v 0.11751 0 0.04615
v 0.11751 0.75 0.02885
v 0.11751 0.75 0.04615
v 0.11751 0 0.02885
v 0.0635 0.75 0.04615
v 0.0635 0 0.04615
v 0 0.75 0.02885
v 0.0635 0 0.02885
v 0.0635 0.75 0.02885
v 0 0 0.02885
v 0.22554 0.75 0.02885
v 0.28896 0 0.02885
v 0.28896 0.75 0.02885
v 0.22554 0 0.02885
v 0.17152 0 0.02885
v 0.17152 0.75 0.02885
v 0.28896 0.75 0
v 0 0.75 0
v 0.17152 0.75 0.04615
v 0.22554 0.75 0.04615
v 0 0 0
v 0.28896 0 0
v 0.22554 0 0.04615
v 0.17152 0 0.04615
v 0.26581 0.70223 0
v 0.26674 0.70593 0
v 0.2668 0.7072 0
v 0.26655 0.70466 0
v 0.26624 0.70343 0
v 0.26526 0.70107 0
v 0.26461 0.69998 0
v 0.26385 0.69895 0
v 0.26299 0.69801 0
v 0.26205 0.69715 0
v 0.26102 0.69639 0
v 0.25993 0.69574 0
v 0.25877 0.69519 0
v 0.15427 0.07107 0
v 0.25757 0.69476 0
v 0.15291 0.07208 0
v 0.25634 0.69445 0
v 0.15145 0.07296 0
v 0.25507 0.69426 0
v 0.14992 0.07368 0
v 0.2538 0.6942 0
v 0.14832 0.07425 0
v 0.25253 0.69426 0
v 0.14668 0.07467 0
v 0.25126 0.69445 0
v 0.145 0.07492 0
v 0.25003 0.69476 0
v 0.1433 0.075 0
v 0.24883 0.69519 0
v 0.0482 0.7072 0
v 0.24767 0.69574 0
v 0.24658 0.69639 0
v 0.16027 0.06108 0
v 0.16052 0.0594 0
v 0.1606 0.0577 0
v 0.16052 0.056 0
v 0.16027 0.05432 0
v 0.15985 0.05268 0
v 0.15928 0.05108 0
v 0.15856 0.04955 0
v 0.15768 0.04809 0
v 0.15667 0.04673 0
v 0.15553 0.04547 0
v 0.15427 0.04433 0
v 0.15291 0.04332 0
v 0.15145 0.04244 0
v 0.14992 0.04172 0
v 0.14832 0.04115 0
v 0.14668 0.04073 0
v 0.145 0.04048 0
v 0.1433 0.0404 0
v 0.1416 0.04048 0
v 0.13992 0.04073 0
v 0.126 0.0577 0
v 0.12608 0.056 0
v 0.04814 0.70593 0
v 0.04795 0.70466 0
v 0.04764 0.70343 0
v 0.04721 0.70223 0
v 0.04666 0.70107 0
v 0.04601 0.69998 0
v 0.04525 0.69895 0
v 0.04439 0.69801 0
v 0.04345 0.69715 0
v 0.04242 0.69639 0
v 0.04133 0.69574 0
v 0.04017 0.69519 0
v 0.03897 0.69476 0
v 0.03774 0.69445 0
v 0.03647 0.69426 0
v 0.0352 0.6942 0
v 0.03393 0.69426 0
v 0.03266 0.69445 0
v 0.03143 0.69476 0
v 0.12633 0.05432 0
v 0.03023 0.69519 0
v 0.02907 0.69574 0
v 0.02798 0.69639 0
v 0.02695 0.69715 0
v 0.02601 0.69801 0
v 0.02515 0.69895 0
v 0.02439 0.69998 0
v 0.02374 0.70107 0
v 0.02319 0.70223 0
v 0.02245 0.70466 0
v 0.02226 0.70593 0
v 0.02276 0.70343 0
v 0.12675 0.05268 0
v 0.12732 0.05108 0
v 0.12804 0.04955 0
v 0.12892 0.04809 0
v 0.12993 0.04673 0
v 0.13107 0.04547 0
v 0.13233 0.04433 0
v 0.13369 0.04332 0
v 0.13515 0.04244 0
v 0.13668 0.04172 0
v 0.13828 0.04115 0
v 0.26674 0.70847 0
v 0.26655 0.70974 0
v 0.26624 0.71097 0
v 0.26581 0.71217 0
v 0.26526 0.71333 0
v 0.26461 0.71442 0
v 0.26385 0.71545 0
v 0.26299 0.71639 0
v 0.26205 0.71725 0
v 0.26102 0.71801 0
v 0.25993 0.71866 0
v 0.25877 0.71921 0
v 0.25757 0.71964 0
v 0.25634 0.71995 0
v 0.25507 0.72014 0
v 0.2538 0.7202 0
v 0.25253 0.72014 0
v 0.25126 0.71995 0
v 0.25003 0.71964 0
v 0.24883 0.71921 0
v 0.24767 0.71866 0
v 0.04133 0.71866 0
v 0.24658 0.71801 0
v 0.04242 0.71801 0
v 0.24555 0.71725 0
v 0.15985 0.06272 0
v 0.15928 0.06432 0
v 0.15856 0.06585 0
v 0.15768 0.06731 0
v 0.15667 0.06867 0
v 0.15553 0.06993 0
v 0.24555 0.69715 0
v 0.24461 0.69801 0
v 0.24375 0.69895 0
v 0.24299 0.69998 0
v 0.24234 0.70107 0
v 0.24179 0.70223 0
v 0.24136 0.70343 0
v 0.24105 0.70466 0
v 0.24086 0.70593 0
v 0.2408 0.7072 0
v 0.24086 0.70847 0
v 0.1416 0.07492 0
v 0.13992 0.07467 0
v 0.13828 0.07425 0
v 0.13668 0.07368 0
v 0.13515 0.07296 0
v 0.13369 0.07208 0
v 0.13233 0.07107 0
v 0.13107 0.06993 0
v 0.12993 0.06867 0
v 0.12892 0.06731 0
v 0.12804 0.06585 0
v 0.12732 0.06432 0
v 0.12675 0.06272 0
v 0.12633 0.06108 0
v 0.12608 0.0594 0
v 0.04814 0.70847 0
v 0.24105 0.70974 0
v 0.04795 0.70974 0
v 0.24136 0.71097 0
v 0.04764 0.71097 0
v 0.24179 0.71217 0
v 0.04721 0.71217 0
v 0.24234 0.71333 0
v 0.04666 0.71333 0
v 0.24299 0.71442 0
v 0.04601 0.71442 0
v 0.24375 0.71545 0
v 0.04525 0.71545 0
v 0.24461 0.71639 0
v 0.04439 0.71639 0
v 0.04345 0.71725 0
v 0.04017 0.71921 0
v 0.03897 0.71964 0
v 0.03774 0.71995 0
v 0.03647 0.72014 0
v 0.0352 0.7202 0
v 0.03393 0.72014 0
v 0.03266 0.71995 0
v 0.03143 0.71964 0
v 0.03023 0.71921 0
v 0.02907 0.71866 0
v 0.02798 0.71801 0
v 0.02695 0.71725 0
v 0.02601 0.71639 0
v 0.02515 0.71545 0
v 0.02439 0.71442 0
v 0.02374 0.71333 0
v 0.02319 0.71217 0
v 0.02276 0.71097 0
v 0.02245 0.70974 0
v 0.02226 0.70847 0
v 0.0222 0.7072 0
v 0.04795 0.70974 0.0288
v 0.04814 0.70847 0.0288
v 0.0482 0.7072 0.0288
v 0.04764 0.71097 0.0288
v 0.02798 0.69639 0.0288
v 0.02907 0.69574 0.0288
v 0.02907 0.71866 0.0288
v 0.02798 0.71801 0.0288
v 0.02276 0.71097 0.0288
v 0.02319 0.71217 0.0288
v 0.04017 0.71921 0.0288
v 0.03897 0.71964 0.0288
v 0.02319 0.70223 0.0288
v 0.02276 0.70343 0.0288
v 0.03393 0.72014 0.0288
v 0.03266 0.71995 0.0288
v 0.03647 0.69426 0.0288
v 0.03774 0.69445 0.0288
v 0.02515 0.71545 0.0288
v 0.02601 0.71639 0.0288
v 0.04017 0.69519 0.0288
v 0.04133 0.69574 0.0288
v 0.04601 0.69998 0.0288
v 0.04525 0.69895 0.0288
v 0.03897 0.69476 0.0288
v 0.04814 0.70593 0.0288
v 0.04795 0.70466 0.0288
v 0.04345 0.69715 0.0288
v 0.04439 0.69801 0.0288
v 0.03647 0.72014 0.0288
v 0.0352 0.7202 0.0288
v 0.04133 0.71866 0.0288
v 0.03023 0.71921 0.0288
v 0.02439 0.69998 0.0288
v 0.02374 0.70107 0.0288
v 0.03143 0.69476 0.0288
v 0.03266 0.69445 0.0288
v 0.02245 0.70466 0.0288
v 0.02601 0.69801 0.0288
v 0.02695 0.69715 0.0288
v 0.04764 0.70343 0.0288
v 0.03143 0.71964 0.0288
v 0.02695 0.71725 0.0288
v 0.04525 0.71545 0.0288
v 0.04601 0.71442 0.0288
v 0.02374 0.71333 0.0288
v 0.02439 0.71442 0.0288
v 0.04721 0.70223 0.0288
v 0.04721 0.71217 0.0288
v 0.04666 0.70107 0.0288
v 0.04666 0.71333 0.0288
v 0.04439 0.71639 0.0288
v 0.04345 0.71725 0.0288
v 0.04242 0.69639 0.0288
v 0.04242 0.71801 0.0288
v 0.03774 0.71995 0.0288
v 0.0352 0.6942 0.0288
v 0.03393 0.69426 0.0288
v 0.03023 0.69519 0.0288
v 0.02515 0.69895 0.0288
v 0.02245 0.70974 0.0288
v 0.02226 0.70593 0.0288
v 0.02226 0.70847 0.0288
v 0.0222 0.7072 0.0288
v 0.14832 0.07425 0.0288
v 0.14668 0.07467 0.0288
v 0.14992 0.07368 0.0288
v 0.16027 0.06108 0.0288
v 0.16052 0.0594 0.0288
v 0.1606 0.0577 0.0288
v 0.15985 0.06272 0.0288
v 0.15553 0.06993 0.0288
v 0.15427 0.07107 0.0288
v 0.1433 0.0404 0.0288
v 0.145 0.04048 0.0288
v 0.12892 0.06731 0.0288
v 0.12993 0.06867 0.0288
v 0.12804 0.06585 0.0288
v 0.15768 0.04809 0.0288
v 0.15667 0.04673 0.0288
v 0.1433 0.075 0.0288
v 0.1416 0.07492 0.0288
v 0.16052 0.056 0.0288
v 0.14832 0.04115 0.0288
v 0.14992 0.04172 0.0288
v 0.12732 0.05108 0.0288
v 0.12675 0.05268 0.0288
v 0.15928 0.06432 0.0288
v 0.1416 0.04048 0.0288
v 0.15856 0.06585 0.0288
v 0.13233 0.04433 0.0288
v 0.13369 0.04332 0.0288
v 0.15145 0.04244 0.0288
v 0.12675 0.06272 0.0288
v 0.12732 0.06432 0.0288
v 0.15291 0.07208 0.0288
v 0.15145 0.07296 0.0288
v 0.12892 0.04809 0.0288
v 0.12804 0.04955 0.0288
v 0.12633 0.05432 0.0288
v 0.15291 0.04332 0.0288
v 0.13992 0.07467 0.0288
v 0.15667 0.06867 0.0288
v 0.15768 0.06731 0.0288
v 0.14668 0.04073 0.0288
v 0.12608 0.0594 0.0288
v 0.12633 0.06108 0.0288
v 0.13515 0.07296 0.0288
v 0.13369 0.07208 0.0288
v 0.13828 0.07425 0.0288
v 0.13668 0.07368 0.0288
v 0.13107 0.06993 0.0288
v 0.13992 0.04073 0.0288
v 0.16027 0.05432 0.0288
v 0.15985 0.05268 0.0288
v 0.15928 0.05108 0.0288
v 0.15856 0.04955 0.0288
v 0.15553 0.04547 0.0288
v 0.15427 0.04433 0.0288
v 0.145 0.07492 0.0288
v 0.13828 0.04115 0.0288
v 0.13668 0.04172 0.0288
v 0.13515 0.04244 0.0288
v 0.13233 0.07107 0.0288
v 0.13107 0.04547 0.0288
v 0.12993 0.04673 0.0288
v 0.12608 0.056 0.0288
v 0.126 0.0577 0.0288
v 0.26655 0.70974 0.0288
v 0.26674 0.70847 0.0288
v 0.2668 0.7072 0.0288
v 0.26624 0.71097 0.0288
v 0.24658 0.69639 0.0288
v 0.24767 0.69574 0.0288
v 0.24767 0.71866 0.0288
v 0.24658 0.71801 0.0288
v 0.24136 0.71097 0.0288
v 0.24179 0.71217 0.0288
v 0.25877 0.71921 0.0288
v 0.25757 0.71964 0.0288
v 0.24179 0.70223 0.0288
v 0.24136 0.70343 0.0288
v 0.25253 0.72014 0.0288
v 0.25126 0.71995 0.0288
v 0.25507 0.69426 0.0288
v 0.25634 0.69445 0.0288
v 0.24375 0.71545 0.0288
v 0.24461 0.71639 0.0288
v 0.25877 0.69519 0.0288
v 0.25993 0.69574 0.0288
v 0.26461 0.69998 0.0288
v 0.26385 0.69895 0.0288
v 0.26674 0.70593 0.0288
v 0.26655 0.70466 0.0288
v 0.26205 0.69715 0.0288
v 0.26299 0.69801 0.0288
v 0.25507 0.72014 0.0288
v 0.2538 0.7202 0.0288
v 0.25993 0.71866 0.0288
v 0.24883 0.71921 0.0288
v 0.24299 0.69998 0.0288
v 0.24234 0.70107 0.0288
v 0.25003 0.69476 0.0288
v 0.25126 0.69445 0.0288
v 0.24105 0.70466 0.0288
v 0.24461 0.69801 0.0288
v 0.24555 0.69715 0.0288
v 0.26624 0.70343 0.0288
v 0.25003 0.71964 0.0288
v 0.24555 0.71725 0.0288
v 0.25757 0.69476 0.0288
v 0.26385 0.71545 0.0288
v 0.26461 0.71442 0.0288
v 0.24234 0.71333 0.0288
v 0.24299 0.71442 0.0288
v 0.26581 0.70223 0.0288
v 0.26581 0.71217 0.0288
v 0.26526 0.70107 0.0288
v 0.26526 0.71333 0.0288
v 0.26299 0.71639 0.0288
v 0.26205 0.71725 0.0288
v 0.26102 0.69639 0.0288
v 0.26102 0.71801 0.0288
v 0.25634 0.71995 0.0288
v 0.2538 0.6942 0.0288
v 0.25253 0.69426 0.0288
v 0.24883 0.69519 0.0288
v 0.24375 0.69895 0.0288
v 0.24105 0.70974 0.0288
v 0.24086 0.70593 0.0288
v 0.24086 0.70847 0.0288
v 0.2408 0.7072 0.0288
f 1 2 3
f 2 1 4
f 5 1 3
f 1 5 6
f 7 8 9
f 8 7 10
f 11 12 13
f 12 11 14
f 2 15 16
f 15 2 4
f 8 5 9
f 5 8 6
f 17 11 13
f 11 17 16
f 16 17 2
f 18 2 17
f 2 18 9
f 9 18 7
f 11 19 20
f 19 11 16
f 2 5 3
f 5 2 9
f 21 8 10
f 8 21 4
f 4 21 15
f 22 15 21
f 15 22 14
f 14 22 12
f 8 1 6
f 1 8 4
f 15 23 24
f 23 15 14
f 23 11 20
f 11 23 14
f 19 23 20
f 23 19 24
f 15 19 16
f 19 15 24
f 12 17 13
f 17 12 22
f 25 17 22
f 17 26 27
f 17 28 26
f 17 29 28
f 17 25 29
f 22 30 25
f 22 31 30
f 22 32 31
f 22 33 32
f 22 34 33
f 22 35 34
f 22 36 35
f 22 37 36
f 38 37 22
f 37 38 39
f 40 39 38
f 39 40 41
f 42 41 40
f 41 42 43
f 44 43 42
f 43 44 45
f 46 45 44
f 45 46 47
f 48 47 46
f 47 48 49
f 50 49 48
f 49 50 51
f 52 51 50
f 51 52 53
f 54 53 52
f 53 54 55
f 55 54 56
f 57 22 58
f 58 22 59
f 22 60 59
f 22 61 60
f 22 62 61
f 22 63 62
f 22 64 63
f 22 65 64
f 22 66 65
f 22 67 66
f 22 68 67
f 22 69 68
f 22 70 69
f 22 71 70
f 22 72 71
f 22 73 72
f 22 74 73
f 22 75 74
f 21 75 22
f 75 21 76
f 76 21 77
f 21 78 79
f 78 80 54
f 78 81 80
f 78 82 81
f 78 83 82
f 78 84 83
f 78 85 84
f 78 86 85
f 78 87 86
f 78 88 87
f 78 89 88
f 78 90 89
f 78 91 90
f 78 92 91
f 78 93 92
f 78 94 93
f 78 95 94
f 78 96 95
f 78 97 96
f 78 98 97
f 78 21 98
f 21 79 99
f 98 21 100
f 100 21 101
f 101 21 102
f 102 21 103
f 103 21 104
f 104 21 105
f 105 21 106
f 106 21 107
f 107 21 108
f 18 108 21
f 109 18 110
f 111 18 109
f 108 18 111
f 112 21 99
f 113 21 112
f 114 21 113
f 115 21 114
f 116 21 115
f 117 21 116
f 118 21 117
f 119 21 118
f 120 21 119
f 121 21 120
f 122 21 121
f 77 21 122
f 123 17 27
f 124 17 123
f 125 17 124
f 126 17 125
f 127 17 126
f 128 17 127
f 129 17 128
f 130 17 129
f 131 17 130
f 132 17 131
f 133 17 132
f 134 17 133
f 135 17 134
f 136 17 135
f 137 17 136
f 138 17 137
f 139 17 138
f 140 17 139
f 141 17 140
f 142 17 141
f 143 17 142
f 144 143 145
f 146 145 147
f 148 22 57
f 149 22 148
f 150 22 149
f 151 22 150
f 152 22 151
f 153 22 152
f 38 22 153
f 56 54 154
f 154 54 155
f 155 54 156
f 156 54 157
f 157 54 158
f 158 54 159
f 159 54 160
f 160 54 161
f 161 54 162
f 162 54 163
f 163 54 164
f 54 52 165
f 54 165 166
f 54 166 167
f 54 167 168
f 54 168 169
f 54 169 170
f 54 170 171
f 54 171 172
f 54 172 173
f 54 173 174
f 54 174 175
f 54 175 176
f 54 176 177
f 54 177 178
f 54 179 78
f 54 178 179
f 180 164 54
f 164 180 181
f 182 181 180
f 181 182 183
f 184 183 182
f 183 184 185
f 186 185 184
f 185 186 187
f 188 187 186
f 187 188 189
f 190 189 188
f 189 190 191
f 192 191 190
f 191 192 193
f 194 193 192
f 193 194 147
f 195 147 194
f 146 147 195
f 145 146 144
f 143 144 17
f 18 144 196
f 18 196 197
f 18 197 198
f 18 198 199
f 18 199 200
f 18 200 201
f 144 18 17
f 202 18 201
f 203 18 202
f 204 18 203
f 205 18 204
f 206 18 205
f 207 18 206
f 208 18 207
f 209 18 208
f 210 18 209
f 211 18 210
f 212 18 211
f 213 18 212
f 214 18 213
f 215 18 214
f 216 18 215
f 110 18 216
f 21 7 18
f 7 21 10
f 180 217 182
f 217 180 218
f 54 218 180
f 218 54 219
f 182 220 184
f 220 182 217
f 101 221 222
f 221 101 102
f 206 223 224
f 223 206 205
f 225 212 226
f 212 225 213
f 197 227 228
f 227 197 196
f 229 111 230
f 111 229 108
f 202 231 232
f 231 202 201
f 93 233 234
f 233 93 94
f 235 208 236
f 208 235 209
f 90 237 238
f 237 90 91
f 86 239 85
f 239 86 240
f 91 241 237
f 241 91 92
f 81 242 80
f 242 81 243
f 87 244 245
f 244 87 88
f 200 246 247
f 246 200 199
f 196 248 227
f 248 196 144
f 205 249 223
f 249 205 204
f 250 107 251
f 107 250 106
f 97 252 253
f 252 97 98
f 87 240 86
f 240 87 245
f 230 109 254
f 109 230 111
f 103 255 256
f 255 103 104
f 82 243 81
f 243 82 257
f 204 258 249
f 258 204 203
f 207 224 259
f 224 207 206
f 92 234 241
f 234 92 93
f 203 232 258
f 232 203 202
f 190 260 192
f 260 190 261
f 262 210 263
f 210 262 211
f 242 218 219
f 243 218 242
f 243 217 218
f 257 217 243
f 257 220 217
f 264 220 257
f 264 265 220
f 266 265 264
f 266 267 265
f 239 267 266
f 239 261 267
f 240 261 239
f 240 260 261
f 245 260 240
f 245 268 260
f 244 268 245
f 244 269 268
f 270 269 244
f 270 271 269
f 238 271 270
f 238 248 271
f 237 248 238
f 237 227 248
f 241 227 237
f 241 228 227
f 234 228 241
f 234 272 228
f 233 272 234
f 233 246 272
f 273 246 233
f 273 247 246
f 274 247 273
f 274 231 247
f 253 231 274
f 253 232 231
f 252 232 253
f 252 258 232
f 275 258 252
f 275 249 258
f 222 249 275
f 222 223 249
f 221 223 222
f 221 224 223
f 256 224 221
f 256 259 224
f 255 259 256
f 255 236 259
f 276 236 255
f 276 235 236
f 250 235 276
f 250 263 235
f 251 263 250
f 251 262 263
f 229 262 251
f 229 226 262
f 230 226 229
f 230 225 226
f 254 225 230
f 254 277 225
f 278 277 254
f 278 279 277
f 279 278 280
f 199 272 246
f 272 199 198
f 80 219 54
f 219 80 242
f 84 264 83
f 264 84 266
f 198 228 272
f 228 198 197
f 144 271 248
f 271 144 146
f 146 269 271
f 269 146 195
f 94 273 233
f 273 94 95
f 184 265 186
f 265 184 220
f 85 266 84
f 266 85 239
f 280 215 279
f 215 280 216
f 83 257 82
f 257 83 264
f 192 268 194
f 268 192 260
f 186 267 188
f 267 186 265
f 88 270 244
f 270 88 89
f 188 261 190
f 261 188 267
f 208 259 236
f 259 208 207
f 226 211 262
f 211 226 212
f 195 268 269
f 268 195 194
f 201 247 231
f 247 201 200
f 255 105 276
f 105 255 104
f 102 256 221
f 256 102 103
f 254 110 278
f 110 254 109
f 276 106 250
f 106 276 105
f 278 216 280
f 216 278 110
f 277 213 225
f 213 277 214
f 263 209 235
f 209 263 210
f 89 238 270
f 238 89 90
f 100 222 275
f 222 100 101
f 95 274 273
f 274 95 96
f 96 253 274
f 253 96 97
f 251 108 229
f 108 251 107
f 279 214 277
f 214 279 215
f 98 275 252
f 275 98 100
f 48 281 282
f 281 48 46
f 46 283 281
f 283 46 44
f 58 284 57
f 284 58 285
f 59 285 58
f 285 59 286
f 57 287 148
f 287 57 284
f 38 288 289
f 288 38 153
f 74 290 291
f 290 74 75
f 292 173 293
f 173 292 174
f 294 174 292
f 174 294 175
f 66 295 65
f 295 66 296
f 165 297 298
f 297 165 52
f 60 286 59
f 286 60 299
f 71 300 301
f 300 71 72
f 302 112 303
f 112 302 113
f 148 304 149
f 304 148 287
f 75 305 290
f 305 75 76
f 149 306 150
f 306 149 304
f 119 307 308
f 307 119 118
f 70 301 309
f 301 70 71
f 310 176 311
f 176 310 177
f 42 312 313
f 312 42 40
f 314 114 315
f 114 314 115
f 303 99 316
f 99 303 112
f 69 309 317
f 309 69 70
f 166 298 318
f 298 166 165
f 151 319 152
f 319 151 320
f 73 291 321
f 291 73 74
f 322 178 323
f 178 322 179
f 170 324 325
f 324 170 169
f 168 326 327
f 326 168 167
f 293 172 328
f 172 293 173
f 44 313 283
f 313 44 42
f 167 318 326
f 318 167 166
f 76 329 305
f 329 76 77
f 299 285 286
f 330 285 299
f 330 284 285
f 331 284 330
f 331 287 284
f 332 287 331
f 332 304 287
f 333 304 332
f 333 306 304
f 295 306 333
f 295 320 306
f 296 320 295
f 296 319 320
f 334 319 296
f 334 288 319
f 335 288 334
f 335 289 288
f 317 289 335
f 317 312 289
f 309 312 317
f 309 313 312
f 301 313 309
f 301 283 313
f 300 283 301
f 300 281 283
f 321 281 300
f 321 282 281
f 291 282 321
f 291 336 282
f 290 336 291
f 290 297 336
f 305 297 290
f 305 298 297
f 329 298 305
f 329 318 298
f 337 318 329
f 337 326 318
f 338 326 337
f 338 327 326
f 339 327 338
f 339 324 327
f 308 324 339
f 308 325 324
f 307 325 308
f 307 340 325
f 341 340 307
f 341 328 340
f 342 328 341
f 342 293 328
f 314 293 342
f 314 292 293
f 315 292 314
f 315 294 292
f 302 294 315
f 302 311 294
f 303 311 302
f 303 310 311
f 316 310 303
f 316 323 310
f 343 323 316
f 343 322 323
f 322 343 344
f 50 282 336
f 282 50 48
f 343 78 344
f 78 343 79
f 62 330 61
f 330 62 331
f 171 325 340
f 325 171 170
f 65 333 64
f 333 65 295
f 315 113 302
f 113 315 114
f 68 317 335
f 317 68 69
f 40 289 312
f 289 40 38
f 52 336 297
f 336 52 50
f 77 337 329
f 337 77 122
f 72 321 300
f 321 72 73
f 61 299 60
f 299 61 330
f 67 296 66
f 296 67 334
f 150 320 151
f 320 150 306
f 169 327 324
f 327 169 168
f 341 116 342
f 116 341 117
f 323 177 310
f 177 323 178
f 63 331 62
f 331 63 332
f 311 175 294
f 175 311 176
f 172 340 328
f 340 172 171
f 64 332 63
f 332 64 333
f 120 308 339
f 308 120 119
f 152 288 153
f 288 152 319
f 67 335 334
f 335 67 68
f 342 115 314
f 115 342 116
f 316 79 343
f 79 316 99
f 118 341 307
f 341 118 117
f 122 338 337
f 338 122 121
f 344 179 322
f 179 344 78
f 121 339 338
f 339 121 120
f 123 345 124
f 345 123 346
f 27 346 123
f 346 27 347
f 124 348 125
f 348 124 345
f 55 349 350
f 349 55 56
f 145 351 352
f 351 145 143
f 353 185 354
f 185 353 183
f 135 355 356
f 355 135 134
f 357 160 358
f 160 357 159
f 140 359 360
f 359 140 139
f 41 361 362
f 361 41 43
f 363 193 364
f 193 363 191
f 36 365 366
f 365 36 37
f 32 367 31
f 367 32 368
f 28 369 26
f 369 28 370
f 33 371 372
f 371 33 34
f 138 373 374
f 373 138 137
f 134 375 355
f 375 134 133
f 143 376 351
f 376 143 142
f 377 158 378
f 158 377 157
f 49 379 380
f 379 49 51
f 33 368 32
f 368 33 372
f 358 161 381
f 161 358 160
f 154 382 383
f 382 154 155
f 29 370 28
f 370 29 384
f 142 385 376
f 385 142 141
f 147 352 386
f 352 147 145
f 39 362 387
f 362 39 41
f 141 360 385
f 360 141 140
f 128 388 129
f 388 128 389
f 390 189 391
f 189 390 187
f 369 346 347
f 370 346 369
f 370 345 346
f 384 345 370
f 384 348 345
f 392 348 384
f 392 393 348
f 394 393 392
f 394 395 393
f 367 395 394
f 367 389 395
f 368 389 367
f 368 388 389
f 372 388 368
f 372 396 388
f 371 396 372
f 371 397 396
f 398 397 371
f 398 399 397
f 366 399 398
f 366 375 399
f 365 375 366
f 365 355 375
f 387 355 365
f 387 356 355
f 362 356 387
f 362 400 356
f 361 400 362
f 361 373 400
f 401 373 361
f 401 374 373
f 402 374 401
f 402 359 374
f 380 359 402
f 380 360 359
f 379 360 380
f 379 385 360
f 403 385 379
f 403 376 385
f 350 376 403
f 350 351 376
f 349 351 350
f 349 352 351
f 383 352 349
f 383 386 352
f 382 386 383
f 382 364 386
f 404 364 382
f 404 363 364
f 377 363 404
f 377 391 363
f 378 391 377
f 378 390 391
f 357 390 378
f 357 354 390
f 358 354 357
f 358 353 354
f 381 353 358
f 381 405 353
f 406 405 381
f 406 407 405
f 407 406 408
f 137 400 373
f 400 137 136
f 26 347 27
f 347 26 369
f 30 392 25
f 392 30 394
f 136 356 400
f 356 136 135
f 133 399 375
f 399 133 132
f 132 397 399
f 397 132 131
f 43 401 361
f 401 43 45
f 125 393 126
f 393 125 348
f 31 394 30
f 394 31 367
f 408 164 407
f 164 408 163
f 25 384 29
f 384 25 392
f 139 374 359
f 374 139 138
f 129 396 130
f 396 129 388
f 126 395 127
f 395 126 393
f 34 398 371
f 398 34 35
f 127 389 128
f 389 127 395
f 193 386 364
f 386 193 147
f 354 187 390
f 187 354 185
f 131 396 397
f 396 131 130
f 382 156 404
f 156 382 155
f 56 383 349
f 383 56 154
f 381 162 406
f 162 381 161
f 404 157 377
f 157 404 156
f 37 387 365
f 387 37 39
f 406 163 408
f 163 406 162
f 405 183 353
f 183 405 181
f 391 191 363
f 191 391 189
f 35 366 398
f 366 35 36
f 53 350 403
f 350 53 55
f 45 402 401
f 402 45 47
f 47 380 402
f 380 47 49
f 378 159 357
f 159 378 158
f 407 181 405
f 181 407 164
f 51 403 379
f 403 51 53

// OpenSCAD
// ==============================================
// Parameters (all dimensions as specified)
// ==============================================
// Base dimensions (X: length, Y: width, Z: height, underside at Z=0)
base_length = 0.28896;
base_width = 0.75;
base_height = 0.028846;
base_extrusion_depth = 0.0288;

// Rib parameters
rib_outside_span = 0.162037;  // Total X span of paired ribs
rib_edge_offset = 0.0635;     // Offset from base edges to outer rib edges
rib_height = 0.017308;        // Height above base top face
rib_extrusion_depth = 0.0173;
rib_width = rib_outside_span / 3;  // Equal width ribs + equal gap between them
rib_gap = rib_width;

// Stepped hole parameters
upper_recess_top_z = 0.0288;
upper_recess_bottom_z = 0.0057;
upper_recess_depth = upper_recess_top_z - upper_recess_bottom_z; // 0.0231 as specified
deep_cut_top_z = 0.0288;
deep_cut_bottom_z = -0.1154;
deep_cut_depth = deep_cut_top_z - deep_cut_bottom_z; // 0.1442 as specified

// Hole position definitions (X = left offset, Y = front offset)
hole_1_r = 0.013;  hole_1_x = 0.0352;  hole_1_y = 0.7072;
hole_2_r = 0.0173; hole_2_x = 0.1433;  hole_2_y = 0.0577;
hole_3_r = 0.013;  hole_3_x = 0.2538;  hole_3_y = 0.7072;

// Curved surface resolution
$fn = 64;

// ==============================================
// Module Definitions
// ==============================================
// Base solid
module base_solid() {
    cube([base_length, base_width, base_height]);
}

// Two separate lengthwise ribs
module lengthwise_ribs() {
    // Left rib
    translate([rib_edge_offset, 0, base_height])
        cube([rib_width, base_width, rib_height]);
    // Right rib
    translate([rib_edge_offset + rib_width + rib_gap, 0, base_height])
        cube([rib_width, base_width, rib_height]);
}

// Reusable stepped hole cutout
module stepped_hole(r, x_pos, y_pos) {
    translate([x_pos, y_pos, 0]) {
        // Upper shallow recess stage
        translate([0, 0, upper_recess_bottom_z + upper_recess_depth/2])
            cylinder(h=upper_recess_depth, r=r, center=true);
        // Deeper through cut stage
        translate([0, 0, deep_cut_bottom_z + deep_cut_depth/2])
            cylinder(h=deep_cut_depth, r=r, center=true);
    }
}

// ==============================================
// Main Model Assembly
// ==============================================
difference() {
    // Merge base and ribs
    union() {
        base_solid();
        lengthwise_ribs();
    }

    // Cut all three stepped holes
    stepped_hole(hole_1_r, hole_1_x, hole_1_y);
    stepped_hole(hole_2_r, hole_2_x, hole_2_y);
    stepped_hole(hole_3_r, hole_3_x, hole_3_y);
}
